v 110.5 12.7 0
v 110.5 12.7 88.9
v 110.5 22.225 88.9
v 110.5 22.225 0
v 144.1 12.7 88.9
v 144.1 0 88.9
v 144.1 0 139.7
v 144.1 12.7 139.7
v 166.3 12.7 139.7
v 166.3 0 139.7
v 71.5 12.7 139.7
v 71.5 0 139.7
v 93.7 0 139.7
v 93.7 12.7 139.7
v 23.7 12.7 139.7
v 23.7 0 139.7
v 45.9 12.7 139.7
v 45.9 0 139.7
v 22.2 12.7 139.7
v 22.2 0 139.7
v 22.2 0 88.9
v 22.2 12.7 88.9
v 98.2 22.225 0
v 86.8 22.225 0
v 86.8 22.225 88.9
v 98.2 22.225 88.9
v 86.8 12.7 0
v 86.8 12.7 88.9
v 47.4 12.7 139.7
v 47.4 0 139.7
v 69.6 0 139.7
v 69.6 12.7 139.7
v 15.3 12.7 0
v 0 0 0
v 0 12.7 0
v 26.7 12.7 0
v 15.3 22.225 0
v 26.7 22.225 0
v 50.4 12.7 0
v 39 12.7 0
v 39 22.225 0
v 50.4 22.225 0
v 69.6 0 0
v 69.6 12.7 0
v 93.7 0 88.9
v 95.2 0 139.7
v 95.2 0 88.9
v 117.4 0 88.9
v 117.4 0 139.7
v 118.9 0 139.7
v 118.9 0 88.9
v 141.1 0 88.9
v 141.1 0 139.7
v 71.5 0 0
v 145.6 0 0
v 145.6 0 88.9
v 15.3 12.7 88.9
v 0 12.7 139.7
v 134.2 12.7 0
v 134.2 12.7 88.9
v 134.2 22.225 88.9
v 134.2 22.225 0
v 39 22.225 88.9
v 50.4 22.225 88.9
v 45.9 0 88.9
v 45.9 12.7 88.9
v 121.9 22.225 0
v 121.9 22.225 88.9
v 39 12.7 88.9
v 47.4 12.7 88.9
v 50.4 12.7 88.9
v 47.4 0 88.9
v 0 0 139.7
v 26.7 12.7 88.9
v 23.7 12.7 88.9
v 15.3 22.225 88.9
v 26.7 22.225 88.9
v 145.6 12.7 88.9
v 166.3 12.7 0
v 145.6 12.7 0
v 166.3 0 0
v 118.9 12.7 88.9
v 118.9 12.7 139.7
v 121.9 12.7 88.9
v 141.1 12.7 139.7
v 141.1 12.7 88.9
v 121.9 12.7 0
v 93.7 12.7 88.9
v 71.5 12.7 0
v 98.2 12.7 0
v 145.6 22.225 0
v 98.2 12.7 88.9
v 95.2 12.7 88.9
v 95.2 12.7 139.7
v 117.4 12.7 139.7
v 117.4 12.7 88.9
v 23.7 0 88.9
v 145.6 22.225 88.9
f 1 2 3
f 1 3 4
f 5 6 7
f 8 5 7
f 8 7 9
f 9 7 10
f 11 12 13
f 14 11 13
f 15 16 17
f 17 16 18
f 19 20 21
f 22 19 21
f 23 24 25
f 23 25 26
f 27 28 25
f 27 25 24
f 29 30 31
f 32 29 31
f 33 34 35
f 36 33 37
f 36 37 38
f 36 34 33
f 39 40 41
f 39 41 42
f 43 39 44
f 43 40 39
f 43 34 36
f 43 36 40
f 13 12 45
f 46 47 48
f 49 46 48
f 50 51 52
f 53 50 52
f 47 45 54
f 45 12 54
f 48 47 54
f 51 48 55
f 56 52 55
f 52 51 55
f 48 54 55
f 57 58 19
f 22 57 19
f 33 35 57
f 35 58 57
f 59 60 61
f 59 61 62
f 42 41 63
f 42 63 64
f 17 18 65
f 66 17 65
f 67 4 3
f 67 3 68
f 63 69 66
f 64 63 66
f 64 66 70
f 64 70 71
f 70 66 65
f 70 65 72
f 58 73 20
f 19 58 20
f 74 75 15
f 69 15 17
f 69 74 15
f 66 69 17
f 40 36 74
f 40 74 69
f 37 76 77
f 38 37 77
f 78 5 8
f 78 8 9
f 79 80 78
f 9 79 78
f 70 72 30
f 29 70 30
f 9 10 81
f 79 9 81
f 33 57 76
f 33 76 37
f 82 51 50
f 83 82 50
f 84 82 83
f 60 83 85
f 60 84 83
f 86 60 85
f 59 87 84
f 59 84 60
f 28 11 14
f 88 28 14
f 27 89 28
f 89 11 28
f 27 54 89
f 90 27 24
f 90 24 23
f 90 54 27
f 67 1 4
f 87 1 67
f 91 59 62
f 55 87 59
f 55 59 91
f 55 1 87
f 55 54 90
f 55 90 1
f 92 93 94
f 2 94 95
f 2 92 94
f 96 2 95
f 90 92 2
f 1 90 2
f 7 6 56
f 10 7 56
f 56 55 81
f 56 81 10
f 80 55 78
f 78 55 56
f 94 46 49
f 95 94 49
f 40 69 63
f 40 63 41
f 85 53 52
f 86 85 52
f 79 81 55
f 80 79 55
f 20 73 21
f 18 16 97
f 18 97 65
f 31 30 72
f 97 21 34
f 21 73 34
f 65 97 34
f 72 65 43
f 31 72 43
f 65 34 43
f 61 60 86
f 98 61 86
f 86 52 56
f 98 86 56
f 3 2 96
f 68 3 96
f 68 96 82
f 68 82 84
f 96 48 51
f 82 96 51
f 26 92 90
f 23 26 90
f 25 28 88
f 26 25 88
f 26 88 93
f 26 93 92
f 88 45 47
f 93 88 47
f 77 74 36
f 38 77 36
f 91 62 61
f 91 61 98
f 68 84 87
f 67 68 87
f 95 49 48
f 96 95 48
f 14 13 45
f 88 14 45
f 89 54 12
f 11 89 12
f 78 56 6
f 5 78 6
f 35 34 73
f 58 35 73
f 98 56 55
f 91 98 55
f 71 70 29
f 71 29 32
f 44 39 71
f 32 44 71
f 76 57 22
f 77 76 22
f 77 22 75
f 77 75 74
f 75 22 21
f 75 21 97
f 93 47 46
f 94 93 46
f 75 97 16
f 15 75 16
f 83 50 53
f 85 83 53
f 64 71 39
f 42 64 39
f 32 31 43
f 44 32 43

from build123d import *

# Parameters (mm, degrees)
BOSS_EXTRUDE1_DEPTH   = 12.7
BOSS_EXTRUDE1_2_DEPTH = 12.7
BOSS_EXTRUDE1_3_DEPTH = 12.7
BOSS_EXTRUDE1_4_DEPTH = 12.7
BOSS_EXTRUDE1_5_DEPTH = 12.7
BOSS_EXTRUDE1_6_DEPTH = 12.7
BOSS_EXTRUDE1_7_DEPTH = 12.7
SKETCH1_4_W           = 11.4
SKETCH1_4_H           = 88.9
BOSS_EXTRUDE2_DEPTH   = 22.225


with BuildPart() as part:
    # Sketch1 → Boss-Extrude1 (new body)
    with BuildSketch(Plane(origin=(0, 0, 0), x_dir=(1, 0, 0), z_dir=(0, 1, 0))):
        Polygon((15.3, -88.9), (15.3, 0), (0, 0), (0, -139.7), (22.2, -139.7), (22.2, -88.9), align=None)
    extrude(amount=BOSS_EXTRUDE1_DEPTH)



with BuildPart() as body_2:
    # Sketch1 → Boss-Extrude1 2 (new body)
    with BuildSketch(Plane(origin=(0, 0, 0), x_dir=(1, 0, 0), z_dir=(0, 1, 0))):
        Polygon((39, 0), (26.7, 0), (26.7, -88.9), (23.7, -88.9), (23.7, -139.7), (45.9, -139.7), (45.9, -88.9), (39, -88.9), align=None)
    extrude(amount=BOSS_EXTRUDE1_2_DEPTH)


with BuildPart() as body_3:
    # Sketch1 → Boss-Extrude1 3 (new body)
    with BuildSketch(Plane(origin=(0, 0, 0), x_dir=(1, 0, 0), z_dir=(0, 1, 0))):
        Polygon((69.6, 0), (50.4, 0), (50.4, -88.9), (47.4, -88.9), (47.4, -139.7), (69.6, -139.7), align=None)
    extrude(amount=BOSS_EXTRUDE1_3_DEPTH)


with BuildPart() as body_4:
    # Sketch1 → Boss-Extrude1 4 (new body)
    with BuildSketch(Plane(origin=(0, 0, 0), x_dir=(1, 0, 0), z_dir=(0, 1, 0))):
        Polygon((86.8, -88.9), (86.8, 0), (71.5, 0), (71.5, -139.7), (93.7, -139.7), (93.7, -88.9), align=None)
    extrude(amount=BOSS_EXTRUDE1_4_DEPTH)


with BuildPart() as body_5:
    # Sketch1 → Boss-Extrude1 5 (new body)
    with BuildSketch(Plane(origin=(0, 0, 0), x_dir=(1, 0, 0), z_dir=(0, 1, 0))):
        Polygon((110.5, 0), (98.2, 0), (98.2, -88.9), (95.2, -88.9), (95.2, -139.7), (117.4, -139.7), (117.4, -88.9), (110.5, -88.9), align=None)
    extrude(amount=BOSS_EXTRUDE1_5_DEPTH)


with BuildPart() as body_6:
    # Sketch1 → Boss-Extrude1 6 (new body)
    with BuildSketch(Plane(origin=(0, 0, 0), x_dir=(1, 0, 0), z_dir=(0, 1, 0))):
        Polygon((134.2, 0), (121.9, 0), (121.9, -88.9), (118.9, -88.9), (118.9, -139.7), (141.1, -139.7), (141.1, -88.9), (134.2, -88.9), align=None)
    extrude(amount=BOSS_EXTRUDE1_6_DEPTH)


with BuildPart() as body_7:
    # Sketch1 → Boss-Extrude1 7 (new body)
    with BuildSketch(Plane(origin=(0, 0, 0), x_dir=(1, 0, 0), z_dir=(0, 1, 0))):
        Polygon((166.3, 0), (145.6, 0), (145.6, -88.9), (144.1, -88.9), (144.1, -139.7), (166.3, -139.7), align=None)
    extrude(amount=BOSS_EXTRUDE1_7_DEPTH)


with BuildPart() as part_1:
    add(part.part)

    add(body_2.part)  # Boss-Extrude2 merges body 2

    add(body_3.part)  # Boss-Extrude2 merges body 3

    add(body_4.part)  # Boss-Extrude2 merges body 4

    add(body_5.part)  # Boss-Extrude2 merges body 5

    add(body_6.part)  # Boss-Extrude2 merges body 6
    # Sketch1<4> → Boss-Extrude2 (add)
    with BuildSketch(Plane(origin=(0, 0, 0), x_dir=(1, 0, 0), z_dir=(0, 1, 0))):
        with Locations((21, -44.45)):
            Rectangle(SKETCH1_4_W, SKETCH1_4_H)
        with Locations((44.7, -44.45)):
            Rectangle(SKETCH1_4_W, SKETCH1_4_H)
        with Locations((92.5, -44.45)):
            Rectangle(SKETCH1_4_W, SKETCH1_4_H)
        with Locations((116.2, -44.45)):
            Rectangle(SKETCH1_4_W, SKETCH1_4_H)
        with Locations((139.9, -44.45)):
            Rectangle(SKETCH1_4_W, SKETCH1_4_H)
    extrude(amount=BOSS_EXTRUDE2_DEPTH)


solid = Compound([body_7.part, part_1.part])
